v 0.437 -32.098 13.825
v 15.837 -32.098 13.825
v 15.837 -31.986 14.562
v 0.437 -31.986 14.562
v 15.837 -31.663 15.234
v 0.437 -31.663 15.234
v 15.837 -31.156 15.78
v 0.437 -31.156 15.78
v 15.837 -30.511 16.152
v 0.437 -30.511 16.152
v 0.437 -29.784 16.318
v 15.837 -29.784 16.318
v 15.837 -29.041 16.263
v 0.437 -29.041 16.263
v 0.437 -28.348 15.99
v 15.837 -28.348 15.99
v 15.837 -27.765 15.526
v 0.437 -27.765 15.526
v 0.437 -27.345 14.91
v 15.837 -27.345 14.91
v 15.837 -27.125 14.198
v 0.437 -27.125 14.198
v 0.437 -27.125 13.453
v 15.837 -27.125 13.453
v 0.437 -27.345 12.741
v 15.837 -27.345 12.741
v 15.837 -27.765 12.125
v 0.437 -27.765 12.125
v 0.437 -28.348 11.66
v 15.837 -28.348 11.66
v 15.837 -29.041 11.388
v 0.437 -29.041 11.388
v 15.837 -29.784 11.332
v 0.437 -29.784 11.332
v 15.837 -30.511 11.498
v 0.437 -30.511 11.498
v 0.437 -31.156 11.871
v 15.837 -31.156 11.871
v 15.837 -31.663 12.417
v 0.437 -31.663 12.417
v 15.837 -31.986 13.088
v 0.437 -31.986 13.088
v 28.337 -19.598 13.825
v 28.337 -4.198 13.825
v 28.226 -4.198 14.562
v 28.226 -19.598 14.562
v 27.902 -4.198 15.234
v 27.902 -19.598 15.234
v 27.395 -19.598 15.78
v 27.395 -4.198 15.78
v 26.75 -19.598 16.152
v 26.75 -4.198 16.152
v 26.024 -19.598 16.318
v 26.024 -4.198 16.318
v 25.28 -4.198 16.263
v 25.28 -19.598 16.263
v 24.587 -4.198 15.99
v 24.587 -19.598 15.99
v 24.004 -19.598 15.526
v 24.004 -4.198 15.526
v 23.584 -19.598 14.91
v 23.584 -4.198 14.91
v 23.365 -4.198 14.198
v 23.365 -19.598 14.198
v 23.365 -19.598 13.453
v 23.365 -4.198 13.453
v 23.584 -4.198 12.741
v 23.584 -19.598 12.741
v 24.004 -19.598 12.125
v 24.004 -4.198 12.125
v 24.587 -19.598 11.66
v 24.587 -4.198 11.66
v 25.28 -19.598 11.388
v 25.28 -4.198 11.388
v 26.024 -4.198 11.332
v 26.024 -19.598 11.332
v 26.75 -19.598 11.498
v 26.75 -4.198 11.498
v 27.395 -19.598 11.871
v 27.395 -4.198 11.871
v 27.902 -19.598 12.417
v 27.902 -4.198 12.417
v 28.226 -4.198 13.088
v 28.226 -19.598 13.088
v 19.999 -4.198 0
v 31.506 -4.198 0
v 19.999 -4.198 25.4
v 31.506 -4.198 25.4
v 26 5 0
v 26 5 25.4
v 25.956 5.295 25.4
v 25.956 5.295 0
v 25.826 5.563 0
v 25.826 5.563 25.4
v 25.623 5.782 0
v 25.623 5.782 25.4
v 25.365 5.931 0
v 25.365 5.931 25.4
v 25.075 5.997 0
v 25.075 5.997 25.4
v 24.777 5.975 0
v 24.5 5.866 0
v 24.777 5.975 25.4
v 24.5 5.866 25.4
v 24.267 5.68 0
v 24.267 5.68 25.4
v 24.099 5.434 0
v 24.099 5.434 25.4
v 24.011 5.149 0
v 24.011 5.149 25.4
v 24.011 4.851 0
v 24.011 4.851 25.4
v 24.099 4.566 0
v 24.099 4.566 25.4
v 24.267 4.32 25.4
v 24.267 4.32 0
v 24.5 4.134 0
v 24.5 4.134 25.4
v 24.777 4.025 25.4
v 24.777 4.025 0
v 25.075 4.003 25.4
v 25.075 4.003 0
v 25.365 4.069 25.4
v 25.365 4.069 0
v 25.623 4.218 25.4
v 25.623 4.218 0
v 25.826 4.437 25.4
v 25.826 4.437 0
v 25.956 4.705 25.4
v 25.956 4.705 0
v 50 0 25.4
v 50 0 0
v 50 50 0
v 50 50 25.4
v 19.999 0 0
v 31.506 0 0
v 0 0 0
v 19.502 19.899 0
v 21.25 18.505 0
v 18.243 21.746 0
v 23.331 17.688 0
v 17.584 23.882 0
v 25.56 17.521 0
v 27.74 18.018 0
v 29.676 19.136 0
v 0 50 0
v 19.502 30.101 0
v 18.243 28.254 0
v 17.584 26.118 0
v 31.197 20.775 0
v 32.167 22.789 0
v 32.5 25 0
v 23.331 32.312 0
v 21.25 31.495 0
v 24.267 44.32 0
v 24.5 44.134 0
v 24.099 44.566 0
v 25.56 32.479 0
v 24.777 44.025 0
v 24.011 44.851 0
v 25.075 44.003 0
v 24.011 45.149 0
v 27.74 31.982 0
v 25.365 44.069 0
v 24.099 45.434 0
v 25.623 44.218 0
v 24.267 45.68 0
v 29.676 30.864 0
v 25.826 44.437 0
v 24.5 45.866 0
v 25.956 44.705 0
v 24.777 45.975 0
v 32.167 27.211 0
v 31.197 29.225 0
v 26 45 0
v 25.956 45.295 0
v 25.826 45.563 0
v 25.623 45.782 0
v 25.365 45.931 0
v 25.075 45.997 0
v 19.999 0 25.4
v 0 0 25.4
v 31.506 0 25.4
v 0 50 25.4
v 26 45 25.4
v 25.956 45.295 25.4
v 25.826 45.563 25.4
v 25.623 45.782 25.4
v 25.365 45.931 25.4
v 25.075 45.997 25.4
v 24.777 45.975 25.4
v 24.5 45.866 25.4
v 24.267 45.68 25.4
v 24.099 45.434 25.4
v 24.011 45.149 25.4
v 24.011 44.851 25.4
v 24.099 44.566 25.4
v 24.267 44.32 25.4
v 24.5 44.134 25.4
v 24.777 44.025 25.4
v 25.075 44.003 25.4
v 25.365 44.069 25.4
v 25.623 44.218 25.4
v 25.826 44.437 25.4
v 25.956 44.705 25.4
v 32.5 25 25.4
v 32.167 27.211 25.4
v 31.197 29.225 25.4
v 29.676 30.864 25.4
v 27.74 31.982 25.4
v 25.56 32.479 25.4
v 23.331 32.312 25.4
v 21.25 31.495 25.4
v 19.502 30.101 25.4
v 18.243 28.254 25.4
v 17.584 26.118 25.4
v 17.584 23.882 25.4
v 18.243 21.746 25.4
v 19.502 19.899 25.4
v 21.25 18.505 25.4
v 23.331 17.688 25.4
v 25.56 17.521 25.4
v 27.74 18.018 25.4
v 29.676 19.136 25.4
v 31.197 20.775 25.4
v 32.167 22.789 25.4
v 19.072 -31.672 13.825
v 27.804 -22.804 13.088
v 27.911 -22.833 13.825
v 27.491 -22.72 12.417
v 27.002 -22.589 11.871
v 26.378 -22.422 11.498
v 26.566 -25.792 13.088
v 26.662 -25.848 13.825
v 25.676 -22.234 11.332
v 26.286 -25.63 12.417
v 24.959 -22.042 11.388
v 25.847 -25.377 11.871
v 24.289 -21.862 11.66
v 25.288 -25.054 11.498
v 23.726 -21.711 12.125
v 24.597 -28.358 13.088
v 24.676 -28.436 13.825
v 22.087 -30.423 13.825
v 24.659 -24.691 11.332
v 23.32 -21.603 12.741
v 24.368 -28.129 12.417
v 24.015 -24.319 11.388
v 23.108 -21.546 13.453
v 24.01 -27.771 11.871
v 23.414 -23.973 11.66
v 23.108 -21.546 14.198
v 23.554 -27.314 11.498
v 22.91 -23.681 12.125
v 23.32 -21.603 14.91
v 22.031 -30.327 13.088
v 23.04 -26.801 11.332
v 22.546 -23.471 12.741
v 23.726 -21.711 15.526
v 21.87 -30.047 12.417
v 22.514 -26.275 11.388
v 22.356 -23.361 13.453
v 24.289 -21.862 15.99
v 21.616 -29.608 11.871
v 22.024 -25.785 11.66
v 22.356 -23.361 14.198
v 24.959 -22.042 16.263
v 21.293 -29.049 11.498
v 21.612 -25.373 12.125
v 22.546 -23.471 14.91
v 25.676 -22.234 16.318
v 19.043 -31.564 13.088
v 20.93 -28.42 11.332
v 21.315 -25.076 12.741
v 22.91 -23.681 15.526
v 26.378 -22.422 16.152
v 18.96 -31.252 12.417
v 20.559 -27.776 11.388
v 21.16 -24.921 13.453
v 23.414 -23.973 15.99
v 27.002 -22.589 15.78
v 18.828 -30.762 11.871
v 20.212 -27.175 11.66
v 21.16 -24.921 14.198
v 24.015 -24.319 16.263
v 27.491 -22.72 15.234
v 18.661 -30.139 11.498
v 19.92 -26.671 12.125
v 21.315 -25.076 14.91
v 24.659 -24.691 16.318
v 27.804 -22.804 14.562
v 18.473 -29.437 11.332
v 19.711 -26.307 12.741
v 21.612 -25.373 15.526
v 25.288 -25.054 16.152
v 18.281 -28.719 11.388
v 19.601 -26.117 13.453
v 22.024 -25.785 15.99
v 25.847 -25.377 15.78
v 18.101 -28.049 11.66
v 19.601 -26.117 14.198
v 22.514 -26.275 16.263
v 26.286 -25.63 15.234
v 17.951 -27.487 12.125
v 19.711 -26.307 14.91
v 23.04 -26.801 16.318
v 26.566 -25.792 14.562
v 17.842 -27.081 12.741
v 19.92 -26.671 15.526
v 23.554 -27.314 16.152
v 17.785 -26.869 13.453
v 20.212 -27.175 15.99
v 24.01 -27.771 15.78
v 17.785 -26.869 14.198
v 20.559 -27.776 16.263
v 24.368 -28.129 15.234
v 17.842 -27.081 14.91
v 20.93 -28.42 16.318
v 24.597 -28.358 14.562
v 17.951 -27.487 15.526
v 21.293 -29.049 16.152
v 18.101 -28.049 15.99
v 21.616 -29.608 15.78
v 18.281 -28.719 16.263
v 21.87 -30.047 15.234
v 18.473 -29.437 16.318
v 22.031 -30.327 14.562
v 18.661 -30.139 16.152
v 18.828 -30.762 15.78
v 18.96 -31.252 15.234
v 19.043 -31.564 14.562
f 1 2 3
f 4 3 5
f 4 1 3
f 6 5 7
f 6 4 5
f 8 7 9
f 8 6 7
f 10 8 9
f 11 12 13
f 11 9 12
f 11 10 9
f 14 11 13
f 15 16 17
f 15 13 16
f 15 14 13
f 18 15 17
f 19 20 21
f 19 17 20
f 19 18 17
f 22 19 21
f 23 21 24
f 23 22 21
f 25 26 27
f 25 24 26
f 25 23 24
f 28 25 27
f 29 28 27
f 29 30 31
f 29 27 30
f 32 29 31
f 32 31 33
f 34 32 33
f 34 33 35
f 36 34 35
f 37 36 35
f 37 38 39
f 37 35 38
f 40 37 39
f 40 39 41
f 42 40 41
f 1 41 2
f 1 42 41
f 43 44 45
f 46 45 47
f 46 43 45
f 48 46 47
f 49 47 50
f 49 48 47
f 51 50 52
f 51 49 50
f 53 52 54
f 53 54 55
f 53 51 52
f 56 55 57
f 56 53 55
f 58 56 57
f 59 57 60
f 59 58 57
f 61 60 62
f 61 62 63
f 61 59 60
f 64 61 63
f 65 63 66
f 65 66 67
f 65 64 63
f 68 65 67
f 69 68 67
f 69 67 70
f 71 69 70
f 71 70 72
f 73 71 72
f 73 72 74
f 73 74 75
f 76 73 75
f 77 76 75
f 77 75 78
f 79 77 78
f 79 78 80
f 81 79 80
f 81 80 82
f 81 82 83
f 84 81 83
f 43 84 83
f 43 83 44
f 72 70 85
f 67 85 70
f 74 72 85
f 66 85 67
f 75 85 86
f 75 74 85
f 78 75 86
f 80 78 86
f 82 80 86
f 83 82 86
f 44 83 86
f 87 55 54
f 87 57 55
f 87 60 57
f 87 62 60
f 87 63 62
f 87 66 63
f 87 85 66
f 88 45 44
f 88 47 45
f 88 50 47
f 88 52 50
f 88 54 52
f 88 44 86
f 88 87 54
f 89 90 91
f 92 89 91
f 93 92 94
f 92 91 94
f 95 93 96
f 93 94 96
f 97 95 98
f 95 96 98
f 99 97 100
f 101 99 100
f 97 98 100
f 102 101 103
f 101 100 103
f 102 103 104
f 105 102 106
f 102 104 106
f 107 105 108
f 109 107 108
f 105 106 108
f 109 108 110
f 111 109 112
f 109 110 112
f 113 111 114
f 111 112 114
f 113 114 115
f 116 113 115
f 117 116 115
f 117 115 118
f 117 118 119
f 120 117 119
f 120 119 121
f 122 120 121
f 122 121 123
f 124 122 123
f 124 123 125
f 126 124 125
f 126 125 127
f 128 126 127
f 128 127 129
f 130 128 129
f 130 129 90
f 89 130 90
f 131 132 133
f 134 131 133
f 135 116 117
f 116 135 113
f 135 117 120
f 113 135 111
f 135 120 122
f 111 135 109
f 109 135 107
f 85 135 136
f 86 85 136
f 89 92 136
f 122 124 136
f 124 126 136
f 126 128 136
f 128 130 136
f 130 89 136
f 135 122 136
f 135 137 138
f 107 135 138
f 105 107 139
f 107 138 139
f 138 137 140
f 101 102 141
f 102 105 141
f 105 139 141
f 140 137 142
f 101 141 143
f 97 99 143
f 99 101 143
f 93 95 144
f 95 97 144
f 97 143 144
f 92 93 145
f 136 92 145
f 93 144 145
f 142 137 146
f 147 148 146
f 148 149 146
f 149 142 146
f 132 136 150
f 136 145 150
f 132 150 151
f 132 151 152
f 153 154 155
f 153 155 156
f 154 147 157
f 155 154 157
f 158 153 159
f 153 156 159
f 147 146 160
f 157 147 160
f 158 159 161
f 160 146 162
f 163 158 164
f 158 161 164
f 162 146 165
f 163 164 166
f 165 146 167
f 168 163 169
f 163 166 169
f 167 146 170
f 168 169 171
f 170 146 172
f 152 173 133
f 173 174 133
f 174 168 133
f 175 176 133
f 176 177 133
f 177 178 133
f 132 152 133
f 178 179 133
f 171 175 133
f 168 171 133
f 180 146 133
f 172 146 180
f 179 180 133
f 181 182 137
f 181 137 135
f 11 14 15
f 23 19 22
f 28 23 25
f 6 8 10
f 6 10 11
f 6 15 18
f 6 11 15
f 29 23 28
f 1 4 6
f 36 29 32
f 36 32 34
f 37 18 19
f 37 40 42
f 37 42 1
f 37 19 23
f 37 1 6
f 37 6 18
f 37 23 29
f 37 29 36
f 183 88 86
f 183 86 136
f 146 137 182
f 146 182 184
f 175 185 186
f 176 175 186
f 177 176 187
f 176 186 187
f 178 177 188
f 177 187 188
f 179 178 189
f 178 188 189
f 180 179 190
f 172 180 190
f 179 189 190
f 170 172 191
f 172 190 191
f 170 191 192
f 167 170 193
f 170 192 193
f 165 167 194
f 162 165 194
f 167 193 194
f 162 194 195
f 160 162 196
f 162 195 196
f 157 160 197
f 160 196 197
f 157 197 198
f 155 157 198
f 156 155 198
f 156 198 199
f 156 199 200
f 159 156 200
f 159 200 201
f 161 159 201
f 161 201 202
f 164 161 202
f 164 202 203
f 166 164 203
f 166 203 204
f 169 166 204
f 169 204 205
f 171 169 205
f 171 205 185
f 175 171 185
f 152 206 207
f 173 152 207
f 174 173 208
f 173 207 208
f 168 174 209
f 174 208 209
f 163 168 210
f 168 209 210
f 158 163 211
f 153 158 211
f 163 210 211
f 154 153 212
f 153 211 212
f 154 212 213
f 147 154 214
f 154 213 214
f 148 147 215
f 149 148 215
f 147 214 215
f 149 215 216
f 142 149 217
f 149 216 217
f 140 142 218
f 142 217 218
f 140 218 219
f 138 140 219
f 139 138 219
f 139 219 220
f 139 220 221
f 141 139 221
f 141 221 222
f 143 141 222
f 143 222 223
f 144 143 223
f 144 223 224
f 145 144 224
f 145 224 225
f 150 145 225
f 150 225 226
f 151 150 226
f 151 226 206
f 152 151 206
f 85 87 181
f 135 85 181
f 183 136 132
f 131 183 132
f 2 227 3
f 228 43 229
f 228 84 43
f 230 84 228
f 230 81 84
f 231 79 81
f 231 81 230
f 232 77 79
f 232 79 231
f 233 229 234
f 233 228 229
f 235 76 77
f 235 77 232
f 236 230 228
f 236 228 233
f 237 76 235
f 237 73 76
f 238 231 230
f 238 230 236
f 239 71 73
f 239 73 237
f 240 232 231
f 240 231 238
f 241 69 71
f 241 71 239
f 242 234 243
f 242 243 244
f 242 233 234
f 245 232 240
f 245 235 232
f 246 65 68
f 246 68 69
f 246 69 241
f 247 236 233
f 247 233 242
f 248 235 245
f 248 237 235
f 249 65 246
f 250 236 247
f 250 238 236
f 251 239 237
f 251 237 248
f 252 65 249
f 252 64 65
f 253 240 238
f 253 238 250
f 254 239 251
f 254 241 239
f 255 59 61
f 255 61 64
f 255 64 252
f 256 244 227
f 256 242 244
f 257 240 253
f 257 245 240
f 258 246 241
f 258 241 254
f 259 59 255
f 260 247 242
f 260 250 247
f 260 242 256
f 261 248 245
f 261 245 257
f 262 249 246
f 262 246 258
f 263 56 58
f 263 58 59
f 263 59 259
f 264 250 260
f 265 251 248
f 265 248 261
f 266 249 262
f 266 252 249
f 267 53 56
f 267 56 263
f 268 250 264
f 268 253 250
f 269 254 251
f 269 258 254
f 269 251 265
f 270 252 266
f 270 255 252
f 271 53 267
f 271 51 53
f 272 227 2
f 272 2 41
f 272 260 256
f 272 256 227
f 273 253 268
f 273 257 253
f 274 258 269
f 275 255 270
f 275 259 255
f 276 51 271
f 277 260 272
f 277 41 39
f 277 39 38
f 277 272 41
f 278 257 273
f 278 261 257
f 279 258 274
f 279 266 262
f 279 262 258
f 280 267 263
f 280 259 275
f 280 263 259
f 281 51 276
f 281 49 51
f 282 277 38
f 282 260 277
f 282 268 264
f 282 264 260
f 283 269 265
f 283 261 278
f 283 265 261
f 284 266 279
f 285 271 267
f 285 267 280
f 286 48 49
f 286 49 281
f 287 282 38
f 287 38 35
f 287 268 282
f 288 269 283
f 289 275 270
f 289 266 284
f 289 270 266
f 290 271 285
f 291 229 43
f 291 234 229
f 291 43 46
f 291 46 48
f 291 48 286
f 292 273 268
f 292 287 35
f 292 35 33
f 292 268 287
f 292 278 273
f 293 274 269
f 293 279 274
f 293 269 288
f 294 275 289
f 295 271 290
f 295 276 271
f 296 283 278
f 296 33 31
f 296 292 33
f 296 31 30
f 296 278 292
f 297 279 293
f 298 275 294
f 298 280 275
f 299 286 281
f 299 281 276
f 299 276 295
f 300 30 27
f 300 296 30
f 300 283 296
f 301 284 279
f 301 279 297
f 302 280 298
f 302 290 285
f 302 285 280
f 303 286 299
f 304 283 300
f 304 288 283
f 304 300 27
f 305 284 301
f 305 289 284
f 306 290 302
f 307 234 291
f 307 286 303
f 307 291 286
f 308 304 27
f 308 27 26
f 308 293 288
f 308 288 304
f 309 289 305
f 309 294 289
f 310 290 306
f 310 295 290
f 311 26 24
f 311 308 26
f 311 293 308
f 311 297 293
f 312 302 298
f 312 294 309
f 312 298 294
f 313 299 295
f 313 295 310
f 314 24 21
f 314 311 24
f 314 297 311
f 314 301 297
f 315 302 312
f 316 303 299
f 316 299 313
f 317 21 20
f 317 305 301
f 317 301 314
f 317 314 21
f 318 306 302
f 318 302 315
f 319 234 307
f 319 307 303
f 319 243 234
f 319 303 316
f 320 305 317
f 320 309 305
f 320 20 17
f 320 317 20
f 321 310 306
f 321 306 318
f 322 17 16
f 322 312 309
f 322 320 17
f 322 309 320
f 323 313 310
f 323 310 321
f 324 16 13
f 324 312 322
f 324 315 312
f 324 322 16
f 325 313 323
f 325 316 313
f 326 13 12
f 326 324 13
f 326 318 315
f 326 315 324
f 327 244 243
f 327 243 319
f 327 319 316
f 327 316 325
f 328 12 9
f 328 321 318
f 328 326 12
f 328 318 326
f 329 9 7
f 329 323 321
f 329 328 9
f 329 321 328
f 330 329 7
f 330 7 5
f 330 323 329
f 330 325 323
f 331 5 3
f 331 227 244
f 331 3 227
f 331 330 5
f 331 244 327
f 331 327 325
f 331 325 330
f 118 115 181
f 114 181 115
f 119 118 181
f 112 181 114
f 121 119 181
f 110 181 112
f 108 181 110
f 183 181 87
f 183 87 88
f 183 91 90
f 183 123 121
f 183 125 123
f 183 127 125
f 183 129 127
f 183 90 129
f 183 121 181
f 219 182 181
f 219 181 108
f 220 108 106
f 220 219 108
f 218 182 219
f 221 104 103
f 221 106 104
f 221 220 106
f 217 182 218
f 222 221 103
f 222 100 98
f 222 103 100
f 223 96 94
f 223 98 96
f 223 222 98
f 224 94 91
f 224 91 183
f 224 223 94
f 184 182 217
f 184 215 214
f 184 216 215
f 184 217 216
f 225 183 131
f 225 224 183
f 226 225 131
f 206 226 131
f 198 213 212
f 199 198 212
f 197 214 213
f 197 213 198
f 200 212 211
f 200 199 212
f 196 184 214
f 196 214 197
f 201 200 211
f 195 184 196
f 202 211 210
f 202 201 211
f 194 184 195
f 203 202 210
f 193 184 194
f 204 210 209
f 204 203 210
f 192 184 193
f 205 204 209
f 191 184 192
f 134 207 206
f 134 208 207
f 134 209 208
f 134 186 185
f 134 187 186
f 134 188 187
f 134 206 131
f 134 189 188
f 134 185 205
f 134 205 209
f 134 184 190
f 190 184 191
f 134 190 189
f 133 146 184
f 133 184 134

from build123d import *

# Parameters (mm, degrees)
SKETCH1_W           = 50
SKETCH1_H           = 50
BOSS_EXTRUDE1_DEPTH = 25.4
SKETCH2_R           = 7.5
SKETCH2_R_2         = 1
CUT_EXTRUDE1_DEPTH  = 26.4
SKETCH3_W           = 11.506935687
SKETCH3_H           = 4.197505038
BOSS_EXTRUDE2_DEPTH = 25.4
SKETCH4_R           = 2.5


with BuildPart() as part:
    # Sketch1 → Boss-Extrude1 (new body)
    with BuildSketch(Plane.XY):
        with Locations((25, 25)):
            Rectangle(SKETCH1_W, SKETCH1_H)
    extrude(amount=BOSS_EXTRUDE1_DEPTH)

    # Sketch2 → Cut-Extrude1 (cut, through all)
    with BuildSketch(Plane.XY.offset(25.4)):
        with Locations((25, 25)):
            Circle(SKETCH2_R)
        with Locations((25, 45)):
            Circle(SKETCH2_R_2)
        with Locations((25, 5)):
            Circle(SKETCH2_R_2)
    extrude(amount=-CUT_EXTRUDE1_DEPTH, mode=Mode.SUBTRACT)

    # Sketch3 → Boss-Extrude2 (add)
    with BuildSketch(Plane.XY.offset(25.4)):
        with Locations((25.752790186, -2.098752519)):
            Rectangle(SKETCH3_W, SKETCH3_H)
    extrude(amount=-BOSS_EXTRUDE2_DEPTH)

    # Sweep1: sweep along a path in Sketch5
    with BuildLine(Plane(origin=(0, 0, 13.825315415), x_dir=(-1, 0, 0), z_dir=(0, 0, -1))) as sweep1_path:
        Line((-25.836773001, -4.197505038), (-25.836773001, -19.597505038))
        ThreePointArc((-25.836773001, -19.597505038), (-22.907840813, -26.66857285), (-15.836773001, -29.597505038))
        Line((-15.836773001, -29.597505038), (-0.436773001, -29.597505038))
    # Sketch4 → Sweep1 (sweep)
    with BuildSketch(Plane.XZ.offset(4.197505038)):
        with Locations((25.836773001, 13.825315415)):
            Circle(SKETCH4_R)
    sweep(path=sweep1_path.line)


solid = part.part
